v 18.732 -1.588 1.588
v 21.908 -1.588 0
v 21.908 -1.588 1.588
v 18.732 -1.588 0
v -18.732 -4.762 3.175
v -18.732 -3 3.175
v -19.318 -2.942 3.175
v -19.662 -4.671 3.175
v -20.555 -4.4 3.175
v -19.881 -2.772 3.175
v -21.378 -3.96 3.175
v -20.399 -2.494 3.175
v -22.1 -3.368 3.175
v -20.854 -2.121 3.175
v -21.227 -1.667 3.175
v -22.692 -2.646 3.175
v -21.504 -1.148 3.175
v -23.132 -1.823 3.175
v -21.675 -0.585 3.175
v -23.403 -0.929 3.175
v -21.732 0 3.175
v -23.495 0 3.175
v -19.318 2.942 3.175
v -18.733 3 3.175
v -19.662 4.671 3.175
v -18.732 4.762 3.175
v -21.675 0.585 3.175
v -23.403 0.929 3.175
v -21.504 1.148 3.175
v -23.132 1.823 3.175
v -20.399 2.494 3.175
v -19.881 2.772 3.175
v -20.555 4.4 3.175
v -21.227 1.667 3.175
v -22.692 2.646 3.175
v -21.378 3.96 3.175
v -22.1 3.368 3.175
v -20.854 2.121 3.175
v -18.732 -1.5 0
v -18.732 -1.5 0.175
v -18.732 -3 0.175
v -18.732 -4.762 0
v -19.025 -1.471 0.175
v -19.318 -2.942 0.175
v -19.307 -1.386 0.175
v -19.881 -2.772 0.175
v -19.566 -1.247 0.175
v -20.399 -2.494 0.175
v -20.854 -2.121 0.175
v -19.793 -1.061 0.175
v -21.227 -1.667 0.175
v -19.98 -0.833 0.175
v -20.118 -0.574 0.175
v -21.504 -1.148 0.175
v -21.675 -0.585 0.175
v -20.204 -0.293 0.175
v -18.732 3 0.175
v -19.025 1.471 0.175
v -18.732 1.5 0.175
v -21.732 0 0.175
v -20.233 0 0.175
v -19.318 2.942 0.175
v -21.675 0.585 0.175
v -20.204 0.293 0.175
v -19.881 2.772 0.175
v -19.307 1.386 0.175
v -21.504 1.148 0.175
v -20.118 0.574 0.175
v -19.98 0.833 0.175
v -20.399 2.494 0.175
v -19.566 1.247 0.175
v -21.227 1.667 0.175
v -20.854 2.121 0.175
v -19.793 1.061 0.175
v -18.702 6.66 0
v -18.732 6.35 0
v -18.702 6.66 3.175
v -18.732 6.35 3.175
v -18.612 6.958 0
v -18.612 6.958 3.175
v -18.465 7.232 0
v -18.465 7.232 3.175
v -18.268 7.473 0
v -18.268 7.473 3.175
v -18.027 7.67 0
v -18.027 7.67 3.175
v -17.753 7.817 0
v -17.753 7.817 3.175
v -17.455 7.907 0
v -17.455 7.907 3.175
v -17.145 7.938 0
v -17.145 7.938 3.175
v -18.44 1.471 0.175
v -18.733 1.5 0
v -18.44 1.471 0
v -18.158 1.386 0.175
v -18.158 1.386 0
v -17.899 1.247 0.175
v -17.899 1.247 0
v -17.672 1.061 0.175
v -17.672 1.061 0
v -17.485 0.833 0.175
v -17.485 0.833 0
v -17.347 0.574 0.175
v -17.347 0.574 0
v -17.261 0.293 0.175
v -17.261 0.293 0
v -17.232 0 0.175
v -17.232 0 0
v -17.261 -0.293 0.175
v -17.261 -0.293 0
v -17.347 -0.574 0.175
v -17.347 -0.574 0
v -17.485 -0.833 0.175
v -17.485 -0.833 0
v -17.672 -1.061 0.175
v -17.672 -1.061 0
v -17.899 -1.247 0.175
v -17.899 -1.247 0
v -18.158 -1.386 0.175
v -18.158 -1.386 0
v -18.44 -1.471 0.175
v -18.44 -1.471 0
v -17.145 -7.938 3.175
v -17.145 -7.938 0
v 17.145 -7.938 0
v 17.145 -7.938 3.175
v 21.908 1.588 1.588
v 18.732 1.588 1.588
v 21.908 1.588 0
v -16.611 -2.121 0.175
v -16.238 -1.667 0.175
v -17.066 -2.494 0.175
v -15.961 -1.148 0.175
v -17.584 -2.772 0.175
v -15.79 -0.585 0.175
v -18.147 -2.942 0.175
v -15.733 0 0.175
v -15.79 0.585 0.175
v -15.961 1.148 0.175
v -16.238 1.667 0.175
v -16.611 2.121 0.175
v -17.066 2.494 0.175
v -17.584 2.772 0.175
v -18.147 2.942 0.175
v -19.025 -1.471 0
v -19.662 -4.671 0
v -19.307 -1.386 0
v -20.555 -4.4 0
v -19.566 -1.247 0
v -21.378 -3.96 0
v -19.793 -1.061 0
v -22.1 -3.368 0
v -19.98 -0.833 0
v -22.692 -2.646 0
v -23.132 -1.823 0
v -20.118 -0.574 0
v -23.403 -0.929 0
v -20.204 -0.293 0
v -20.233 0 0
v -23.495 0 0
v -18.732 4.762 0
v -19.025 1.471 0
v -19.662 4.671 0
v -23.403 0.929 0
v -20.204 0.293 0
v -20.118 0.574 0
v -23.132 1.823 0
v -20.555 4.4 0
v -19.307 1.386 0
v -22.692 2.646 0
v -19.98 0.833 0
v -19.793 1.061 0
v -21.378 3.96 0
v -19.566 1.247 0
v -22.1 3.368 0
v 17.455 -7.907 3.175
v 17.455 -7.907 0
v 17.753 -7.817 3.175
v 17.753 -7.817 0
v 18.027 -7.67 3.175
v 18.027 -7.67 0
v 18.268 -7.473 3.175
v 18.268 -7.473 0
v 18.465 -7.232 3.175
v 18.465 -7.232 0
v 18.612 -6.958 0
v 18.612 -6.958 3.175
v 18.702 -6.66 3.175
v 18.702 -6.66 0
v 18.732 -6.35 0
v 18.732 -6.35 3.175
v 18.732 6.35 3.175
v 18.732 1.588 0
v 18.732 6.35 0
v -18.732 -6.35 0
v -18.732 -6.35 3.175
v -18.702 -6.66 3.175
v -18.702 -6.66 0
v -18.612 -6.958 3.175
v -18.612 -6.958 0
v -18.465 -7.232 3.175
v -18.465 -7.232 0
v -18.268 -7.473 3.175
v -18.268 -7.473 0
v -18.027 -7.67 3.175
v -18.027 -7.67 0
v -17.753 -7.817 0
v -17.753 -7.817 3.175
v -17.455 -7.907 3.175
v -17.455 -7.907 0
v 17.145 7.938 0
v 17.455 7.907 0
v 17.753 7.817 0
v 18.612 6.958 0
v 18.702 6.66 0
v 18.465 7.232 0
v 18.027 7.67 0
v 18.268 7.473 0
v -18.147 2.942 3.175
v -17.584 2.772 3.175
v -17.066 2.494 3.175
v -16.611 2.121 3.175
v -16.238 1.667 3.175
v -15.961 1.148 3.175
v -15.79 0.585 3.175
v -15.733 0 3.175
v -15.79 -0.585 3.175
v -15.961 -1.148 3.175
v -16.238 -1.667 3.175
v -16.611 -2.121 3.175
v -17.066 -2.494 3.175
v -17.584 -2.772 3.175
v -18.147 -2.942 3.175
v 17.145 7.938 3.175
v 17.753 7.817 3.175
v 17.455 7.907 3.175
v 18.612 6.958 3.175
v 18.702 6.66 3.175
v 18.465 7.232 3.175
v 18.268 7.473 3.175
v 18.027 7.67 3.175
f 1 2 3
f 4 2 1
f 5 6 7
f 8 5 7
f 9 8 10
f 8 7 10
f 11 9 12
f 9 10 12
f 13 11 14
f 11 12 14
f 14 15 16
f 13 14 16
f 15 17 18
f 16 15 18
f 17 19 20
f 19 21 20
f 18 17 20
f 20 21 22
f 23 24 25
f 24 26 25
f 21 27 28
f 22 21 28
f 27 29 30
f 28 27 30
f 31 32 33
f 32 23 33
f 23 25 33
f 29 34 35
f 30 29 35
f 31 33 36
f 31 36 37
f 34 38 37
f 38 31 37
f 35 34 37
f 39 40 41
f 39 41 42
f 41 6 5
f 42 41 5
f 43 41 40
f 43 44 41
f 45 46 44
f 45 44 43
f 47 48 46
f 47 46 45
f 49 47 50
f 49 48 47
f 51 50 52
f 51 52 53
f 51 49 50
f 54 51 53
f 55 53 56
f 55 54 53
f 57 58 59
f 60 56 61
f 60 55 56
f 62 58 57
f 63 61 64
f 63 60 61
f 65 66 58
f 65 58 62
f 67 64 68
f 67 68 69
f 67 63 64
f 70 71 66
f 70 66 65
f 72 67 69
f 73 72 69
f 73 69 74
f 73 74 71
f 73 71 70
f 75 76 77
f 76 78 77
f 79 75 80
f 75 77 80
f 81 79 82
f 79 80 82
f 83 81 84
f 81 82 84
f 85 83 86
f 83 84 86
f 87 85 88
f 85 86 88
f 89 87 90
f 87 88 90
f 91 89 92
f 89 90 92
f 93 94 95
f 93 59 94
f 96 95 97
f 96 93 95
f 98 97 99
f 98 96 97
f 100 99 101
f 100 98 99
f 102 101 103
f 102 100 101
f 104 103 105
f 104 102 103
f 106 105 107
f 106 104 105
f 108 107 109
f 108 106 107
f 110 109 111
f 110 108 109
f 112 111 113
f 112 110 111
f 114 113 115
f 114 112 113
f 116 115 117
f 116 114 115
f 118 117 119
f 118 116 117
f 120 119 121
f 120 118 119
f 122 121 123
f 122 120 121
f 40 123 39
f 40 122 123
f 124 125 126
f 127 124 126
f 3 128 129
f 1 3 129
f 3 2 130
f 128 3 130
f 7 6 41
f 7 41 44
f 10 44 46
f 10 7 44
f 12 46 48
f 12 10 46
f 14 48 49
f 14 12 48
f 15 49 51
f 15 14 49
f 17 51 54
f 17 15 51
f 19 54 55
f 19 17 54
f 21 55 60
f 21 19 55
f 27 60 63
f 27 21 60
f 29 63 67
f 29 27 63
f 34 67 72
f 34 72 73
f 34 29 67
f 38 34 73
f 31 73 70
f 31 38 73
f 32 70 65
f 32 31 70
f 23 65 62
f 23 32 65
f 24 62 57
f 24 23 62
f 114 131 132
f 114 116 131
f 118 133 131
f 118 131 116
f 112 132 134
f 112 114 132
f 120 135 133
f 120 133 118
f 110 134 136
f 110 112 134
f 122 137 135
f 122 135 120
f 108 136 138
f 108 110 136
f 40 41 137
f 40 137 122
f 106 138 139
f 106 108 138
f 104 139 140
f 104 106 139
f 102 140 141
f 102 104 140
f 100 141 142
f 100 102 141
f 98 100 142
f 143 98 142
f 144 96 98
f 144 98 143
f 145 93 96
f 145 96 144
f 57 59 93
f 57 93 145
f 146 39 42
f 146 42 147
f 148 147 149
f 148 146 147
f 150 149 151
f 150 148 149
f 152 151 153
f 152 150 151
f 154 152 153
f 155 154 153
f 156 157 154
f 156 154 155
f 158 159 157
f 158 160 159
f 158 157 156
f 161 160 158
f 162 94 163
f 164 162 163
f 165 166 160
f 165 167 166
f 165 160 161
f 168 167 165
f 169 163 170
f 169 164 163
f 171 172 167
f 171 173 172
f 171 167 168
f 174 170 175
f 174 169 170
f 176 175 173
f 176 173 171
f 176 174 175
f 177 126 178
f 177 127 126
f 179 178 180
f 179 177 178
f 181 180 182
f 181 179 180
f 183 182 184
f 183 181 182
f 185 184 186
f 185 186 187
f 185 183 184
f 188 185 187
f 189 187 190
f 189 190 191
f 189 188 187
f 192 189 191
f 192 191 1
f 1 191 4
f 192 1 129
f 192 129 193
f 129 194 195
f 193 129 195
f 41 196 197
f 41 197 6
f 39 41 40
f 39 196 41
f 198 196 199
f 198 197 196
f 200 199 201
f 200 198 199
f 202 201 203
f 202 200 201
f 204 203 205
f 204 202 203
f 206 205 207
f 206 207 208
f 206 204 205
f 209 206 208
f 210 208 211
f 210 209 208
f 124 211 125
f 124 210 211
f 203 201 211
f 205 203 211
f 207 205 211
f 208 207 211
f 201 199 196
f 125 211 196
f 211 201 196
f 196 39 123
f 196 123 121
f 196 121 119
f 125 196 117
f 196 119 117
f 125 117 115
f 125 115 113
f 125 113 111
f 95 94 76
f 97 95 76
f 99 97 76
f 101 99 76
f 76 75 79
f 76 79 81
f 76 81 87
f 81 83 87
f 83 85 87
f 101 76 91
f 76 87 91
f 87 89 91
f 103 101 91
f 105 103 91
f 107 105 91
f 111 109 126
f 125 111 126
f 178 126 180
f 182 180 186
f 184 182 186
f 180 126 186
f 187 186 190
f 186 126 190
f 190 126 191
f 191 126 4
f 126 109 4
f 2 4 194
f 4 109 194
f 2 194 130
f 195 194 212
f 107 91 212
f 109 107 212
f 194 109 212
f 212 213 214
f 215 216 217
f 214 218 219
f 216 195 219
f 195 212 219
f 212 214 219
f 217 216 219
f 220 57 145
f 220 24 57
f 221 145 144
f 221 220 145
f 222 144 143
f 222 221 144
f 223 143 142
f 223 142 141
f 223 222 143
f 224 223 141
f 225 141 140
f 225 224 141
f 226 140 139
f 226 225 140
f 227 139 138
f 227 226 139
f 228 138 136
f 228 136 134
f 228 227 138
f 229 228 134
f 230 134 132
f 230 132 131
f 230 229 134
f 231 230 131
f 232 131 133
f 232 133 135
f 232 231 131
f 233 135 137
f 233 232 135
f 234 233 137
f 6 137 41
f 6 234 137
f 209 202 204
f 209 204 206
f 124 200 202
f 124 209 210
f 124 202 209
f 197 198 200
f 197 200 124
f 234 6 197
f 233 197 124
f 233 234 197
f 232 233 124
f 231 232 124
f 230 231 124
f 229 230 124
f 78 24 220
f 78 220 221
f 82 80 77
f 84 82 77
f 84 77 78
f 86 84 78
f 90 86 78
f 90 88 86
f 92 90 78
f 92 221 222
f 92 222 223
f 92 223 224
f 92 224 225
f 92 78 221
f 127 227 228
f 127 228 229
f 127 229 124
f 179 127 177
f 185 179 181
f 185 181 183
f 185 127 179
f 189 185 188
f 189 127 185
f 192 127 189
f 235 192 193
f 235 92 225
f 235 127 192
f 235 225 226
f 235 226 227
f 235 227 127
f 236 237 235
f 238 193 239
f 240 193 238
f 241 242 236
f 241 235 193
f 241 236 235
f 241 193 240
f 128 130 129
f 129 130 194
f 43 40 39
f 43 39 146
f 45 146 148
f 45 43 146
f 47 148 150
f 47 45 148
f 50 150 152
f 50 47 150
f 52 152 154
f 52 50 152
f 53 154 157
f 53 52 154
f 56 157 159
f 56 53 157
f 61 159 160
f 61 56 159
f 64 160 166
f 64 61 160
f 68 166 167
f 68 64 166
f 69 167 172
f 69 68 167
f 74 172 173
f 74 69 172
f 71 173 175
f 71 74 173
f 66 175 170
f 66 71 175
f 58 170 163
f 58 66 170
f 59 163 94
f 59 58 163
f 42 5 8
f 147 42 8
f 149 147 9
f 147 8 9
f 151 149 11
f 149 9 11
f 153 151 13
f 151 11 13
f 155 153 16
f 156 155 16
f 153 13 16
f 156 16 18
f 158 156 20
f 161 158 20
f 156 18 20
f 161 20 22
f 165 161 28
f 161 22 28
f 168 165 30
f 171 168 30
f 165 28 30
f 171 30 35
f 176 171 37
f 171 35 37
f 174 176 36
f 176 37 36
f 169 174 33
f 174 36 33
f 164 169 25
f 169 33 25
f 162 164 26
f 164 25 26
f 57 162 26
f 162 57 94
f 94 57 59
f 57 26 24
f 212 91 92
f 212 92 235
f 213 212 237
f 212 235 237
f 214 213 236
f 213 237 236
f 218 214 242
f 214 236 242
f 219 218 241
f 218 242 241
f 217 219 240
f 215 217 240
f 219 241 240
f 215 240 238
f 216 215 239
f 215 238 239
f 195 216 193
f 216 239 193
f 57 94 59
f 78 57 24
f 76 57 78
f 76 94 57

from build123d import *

# Parameters (mm, degrees)
SKETCH1_W           = 37.465
SKETCH1_H           = 15.875
BOSS_EXTRUDE1_DEPTH = 3.175
BOSS_EXTRUDE2_DEPTH = 3.175
FILLET2_R           = 1.5875
SKETCH5_W           = 3.175
SKETCH5_H           = 3.175
BOSS_EXTRUDE3_DEPTH = 1.5875


with BuildPart() as part:
    # Sketch1 → Boss-Extrude1 (new body)
    with BuildSketch(Plane.XY):
        Rectangle(SKETCH1_W, SKETCH1_H)
    extrude(amount=BOSS_EXTRUDE1_DEPTH)


with BuildPart() as body_2:
    # Sketch2 → Boss-Extrude2 (new body)
    with BuildSketch(Plane.XY.offset(3.175)):
        with BuildLine():
            Line((-18.7325, 4.7625), (-18.7325, -4.7625))
            ThreePointArc((-18.7325, -4.7625), (-23.495, 0), (-18.7325, 4.7625))
        make_face()
    extrude(amount=-BOSS_EXTRUDE2_DEPTH)


with BuildPart() as cbore_for_00_binding_head_machine_screw_tool:
    # Sketch4 → CBORE for #00 Binding Head Machine Screw1 (revolve)
    with BuildSketch(Plane(origin=(-18.7325, 0, 3.175), x_dir=(0, -1, 0), z_dir=(1, 0, 0))):
        Polygon((0, 0), (0, 3.175), (1.500000048, 3.175), (1.500000048, 3.000000096), (2.999999969, 3.000000096), (2.999999969, 0), align=None)
    revolve(axis=Axis((-18.7325, 0, 9.525), (0, 0, -1)))


with BuildPart() as part_1:
    add(part.part)

    # CBORE for #00 Binding Head Machine Screw1: cut by cbore_for_00_binding_head_machine_screw_tool
    add(cbore_for_00_binding_head_machine_screw_tool.part, mode=Mode.SUBTRACT)

    # Fillet2
    fillet2_edges = [part_1.edges().sort_by_distance(p)[0] for p in [
        (18.7325, -7.9375, 1.5875),
        (-18.7325, -7.9375, 1.5875),
        (-18.7325, 7.9375, 1.5875),
        (18.7325, 7.9375, 1.5875),
    ]]
    fillet(fillet2_edges, radius=FILLET2_R)

    # Sketch5 → Boss-Extrude3 (add)
    with BuildSketch(Plane(origin=(0, 0, 0), x_dir=(-1, 0, 0), z_dir=(0, 0, -1))):
        with Locations((-20.32, 0)):
            Rectangle(SKETCH5_W, SKETCH5_H)
    extrude(amount=-BOSS_EXTRUDE3_DEPTH)


with BuildPart() as body_2_1:
    add(body_2.part)

    # CBORE for #00 Binding Head Machine Screw1: cut by cbore_for_00_binding_head_machine_screw_tool
    add(cbore_for_00_binding_head_machine_screw_tool.part, mode=Mode.SUBTRACT)


solid = Compound([part_1.part, body_2_1.part])
